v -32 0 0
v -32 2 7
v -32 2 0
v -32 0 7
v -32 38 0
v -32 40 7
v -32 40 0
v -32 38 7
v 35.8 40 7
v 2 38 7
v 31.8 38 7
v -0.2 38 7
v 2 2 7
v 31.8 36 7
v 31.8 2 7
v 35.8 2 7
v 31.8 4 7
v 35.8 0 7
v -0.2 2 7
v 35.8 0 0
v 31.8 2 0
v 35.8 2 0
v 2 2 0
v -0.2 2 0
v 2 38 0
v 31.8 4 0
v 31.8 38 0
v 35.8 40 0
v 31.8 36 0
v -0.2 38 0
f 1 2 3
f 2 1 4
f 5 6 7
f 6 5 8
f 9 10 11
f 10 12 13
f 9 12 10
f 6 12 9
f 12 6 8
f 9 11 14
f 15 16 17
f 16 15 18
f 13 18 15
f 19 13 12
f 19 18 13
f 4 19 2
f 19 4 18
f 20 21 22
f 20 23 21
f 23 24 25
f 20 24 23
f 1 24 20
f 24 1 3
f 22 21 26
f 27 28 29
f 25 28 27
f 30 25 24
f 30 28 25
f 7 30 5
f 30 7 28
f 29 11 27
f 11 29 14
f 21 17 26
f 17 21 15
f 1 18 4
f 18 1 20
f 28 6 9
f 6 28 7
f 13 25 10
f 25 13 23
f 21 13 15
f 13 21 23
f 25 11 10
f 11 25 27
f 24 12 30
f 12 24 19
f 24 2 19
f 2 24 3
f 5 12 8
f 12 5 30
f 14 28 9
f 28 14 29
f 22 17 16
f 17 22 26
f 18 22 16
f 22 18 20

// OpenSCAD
// : mm of extra z clearance you wish to add. usually around your glass thickness. note: 1/8" = 3.175mm, 3/8" = 9.525mm, 5/8" = 15.625mm, 3/4" = 19.05mm
EXTRA_HEIGHT = 2; // [0.8, 1, 1.5, 2, 2.5, 3, 3.175, 3.5, 4, 4.5, 5, 5.6, 6, 9.525, 15.625, 19.05]
// : how wide you want the spacer to be. 7mm is just right for fully covering the exposed side.
SPACER_WIDTH = 7; // [5,6,7]
// : how much you would like the tines of the hook to stick out. 
HOOK_PROTUBERANCE = 2.0; // [2.0, 3.0, 4.0]
// : add insertion levers on the back allowing you to insert and remove from the machine without disassembly. 1=Levers 0=No Levers
INSERTION_LEVERS = 1; // [0,1]

module zadjust() {

    HOOK_LENGTH = HOOK_PROTUBERANCE;
    ID_HEIGHT = 36;
    ID_WIDTH = 29.8;
    BASE_WIDTH = 2;
    LEVER_LENGTH = 32;

    translate([ID_WIDTH+HOOK_LENGTH, ID_HEIGHT+BASE_WIDTH+EXTRA_HEIGHT])
rotate([0,0,180]){
    // C shape
    difference() {
        // positive
        xsize = INSERTION_LEVERS ? ID_WIDTH+BASE_WIDTH+LEVER_LENGTH : ID_WIDTH+BASE_WIDTH;
        scale([xsize, ID_HEIGHT+BASE_WIDTH+EXTRA_HEIGHT, SPACER_WIDTH])
            cube();
        
        // negative
        translate([-0.01, BASE_WIDTH, -0.01])
            scale([ID_WIDTH+0.01,ID_HEIGHT,SPACER_WIDTH+0.02])
                cube();
        
        // insertion levers
        if(INSERTION_LEVERS)
            translate([LEVER_LENGTH, BASE_WIDTH, -0.01])
                scale([LEVER_LENGTH+BASE_WIDTH+0.01,ID_HEIGHT,SPACER_WIDTH+0.02])
                    cube();
    }
    
    // top hook
    translate([-BASE_WIDTH*HOOK_LENGTH,0,0])
        scale([BASE_WIDTH*HOOK_LENGTH, BASE_WIDTH+HOOK_PROTUBERANCE, SPACER_WIDTH])
            linear_extrude(1)
                polygon(points=[[1,1],[1,0],[0,0]]);
    
    // bottom hook
    translate([-BASE_WIDTH*HOOK_LENGTH,ID_HEIGHT+BASE_WIDTH+EXTRA_HEIGHT-(HOOK_PROTUBERANCE+EXTRA_HEIGHT),0])
        scale([BASE_WIDTH*HOOK_LENGTH, HOOK_PROTUBERANCE, SPACER_WIDTH])
            linear_extrude(1)
                translate([0,1,0])
                rotate([180,0,0])
                polygon(points=[[1,1],[1,0],[0,0]]);
    
    // bottom fill
    translate([-BASE_WIDTH*HOOK_LENGTH,ID_HEIGHT+BASE_WIDTH,0])
    scale([BASE_WIDTH*HOOK_LENGTH,EXTRA_HEIGHT,SPACER_WIDTH])
    cube();
}
}
color([0.4,0.7,0.8])
zadjust();
